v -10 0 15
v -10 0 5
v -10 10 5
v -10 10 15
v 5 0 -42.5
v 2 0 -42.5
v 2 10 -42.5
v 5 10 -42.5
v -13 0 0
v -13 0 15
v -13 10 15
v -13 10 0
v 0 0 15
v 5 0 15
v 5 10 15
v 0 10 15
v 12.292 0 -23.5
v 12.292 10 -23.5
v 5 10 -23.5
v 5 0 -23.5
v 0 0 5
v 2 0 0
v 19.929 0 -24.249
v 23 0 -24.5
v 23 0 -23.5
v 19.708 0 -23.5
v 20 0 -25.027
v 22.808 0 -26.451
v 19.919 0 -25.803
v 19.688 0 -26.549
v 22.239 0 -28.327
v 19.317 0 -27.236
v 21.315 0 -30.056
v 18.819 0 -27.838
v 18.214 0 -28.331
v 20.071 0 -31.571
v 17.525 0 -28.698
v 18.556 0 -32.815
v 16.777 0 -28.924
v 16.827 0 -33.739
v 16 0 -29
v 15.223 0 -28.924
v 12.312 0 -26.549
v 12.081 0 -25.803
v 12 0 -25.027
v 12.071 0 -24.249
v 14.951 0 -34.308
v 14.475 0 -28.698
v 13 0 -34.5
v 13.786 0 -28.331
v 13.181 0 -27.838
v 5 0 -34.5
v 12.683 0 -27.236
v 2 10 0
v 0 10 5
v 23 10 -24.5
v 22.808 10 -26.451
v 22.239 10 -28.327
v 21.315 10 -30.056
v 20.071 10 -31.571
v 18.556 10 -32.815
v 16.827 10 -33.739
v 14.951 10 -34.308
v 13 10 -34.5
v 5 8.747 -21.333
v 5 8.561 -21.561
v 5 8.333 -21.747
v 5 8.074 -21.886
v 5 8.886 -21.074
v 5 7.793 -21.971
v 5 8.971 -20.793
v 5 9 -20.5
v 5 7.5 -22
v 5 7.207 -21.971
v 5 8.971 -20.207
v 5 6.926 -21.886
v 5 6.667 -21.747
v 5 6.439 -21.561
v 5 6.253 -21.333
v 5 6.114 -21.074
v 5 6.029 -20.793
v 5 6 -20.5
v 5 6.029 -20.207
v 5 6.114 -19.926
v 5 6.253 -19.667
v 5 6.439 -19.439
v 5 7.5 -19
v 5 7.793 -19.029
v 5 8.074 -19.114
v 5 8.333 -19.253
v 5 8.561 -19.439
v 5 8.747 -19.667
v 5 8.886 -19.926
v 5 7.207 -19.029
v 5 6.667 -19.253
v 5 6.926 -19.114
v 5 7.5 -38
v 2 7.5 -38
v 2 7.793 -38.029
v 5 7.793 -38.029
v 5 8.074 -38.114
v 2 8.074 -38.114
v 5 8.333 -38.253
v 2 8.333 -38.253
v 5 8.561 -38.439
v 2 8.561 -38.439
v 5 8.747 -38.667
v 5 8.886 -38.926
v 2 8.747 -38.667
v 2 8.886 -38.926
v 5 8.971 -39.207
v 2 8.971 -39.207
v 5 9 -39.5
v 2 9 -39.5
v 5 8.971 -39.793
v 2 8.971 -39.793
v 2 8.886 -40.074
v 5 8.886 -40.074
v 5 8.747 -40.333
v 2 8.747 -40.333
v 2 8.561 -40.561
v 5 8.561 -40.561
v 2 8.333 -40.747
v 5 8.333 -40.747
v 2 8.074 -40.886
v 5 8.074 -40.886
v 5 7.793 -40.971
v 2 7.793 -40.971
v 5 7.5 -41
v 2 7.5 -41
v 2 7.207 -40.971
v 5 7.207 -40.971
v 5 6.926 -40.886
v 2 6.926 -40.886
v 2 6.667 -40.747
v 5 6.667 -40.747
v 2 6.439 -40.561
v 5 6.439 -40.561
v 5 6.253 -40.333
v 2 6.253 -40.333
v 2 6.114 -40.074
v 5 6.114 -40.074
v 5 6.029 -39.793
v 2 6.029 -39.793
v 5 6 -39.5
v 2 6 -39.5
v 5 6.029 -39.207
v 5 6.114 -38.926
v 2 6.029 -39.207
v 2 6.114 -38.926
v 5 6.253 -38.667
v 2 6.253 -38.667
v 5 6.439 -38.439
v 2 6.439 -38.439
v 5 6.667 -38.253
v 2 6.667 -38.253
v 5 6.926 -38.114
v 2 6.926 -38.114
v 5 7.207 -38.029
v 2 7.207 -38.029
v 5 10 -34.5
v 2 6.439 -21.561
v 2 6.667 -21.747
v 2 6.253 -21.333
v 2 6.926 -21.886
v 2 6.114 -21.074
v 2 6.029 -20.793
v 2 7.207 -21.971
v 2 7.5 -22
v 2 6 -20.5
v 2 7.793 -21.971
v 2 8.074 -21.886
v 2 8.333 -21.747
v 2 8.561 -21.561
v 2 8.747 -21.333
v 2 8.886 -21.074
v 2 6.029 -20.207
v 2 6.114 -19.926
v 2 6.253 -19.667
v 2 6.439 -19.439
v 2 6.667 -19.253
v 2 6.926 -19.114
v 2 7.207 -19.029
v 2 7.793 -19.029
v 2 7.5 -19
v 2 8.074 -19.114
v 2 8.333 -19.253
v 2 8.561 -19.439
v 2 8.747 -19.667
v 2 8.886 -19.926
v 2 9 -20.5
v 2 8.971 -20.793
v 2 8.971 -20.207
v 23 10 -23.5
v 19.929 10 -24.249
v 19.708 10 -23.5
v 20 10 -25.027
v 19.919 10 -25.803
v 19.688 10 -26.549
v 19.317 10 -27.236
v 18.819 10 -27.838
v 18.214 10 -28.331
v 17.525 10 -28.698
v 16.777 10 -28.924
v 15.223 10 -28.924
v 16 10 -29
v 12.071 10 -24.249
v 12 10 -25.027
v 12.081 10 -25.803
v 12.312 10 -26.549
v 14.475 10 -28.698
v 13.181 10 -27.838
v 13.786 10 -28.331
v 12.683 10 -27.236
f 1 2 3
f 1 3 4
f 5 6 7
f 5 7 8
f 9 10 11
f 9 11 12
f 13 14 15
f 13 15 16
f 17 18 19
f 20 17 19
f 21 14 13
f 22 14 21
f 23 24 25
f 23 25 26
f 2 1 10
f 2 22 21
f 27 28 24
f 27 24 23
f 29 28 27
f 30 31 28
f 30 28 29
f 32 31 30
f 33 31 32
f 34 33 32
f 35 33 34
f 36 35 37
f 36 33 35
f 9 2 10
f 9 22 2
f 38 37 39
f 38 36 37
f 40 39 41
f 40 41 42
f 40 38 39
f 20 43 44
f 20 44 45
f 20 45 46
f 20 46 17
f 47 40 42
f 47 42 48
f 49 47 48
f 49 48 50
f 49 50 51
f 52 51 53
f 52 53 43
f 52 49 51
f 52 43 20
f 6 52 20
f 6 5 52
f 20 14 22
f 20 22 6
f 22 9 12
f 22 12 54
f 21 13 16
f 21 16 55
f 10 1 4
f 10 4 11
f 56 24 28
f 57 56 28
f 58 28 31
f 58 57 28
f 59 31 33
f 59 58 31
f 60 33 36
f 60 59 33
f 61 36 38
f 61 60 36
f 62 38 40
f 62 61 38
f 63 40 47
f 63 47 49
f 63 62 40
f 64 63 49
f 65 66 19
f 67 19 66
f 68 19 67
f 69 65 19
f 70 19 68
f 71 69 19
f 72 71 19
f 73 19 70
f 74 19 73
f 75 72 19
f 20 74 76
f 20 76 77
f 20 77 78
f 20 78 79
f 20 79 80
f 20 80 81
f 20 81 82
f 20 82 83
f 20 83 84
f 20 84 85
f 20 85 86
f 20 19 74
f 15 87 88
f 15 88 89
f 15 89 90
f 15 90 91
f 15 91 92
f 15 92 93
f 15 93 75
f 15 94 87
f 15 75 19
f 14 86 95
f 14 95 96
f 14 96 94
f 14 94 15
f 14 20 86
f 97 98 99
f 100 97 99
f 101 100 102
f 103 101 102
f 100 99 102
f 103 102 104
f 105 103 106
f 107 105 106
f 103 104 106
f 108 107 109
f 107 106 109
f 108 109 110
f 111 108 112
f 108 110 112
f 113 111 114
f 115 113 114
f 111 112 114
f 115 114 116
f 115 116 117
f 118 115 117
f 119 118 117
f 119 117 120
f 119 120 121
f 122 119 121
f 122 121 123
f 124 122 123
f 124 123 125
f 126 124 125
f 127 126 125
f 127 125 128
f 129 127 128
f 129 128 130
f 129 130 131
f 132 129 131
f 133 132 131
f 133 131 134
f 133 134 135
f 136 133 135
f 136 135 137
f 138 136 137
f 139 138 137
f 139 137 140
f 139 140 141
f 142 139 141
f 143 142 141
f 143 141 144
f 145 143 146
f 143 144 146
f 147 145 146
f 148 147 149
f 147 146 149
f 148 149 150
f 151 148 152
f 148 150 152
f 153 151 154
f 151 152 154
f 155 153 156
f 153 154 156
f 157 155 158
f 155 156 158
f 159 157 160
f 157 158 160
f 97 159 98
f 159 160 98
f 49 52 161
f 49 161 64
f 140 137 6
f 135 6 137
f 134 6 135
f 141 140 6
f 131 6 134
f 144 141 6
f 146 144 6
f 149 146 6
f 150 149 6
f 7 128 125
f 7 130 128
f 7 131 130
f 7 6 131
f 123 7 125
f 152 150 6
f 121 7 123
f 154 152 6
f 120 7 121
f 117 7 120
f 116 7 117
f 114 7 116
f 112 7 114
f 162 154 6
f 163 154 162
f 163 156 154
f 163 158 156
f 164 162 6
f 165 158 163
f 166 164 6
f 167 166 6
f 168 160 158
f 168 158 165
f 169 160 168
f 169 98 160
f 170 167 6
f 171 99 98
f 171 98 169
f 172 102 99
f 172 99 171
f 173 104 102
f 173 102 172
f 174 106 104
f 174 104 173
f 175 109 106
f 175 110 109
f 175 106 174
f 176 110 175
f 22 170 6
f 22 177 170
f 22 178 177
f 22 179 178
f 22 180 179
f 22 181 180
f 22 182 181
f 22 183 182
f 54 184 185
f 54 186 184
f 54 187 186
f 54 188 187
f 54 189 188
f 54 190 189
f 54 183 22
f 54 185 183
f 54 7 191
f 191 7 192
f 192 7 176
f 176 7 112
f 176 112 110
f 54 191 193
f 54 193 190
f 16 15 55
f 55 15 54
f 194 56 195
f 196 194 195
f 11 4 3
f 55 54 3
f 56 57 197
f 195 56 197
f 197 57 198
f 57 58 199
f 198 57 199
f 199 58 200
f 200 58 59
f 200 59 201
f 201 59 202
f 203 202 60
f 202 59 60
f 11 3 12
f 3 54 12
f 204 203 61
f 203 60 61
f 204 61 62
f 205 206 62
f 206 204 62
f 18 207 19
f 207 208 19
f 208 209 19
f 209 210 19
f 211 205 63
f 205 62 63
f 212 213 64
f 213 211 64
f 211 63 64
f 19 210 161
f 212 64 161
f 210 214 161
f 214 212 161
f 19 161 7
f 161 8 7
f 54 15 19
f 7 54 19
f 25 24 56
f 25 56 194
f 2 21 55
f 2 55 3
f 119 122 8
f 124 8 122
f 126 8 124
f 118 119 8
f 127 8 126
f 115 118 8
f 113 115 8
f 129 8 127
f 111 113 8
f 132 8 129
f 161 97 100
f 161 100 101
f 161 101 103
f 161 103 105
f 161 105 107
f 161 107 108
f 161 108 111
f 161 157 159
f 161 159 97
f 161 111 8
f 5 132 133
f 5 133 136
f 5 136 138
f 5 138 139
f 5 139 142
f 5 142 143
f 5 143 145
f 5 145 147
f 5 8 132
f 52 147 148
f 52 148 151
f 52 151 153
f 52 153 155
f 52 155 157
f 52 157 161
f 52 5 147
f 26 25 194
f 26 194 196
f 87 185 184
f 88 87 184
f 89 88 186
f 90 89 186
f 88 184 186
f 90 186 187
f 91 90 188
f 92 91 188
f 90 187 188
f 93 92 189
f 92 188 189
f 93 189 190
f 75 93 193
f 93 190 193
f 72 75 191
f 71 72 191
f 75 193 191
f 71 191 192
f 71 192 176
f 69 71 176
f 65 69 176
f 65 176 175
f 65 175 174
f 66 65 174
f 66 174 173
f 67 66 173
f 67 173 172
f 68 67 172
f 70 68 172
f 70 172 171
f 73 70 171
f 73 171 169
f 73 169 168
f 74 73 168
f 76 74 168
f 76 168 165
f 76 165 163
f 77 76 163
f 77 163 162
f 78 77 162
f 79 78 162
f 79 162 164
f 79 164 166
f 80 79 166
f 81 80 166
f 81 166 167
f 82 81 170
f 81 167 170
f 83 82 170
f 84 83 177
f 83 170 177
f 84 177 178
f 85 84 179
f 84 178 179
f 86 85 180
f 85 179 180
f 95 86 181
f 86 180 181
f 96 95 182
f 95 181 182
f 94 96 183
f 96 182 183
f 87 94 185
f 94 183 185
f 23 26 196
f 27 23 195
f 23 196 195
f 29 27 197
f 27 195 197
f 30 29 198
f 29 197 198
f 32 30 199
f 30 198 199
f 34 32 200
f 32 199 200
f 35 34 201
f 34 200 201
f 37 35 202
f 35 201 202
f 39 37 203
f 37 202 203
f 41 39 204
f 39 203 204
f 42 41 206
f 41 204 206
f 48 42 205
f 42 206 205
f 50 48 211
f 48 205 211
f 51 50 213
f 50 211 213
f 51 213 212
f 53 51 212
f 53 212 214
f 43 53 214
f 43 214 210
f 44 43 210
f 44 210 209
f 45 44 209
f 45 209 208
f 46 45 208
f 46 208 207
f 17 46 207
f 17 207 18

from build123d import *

# Parameters (mm, degrees)
BOSS_EXTRUDE1_DEPTH = 10
SKETCH2_R           = 4
CUT_EXTRUDE1_DEPTH  = 50.348252249
SKETCH3_R           = 1.5
CUT_EXTRUDE2_DEPTH  = 50.348252249
SKETCH5_W           = 42.5
SKETCH5_H           = 10
CUT_EXTRUDE4_DEPTH  = 2
FILLET1_R           = 10


with BuildPart() as part:
    # Sketch1 → Boss-Extrude1 (new body)
    with BuildSketch(Plane(origin=(0, 0, 0), x_dir=(1, 0, 0), z_dir=(0, 1, 0))):
        Polygon((0, 0), (0, 34), (0, 42.5), (5, 42.5), (5, 34.5), (23, 34.5), (23, 23.5), (5, 23.5), (5, -15), (0, -15), (0, -5), (-10, -5), (-10, -15), (-13, -15), (-13, 0), align=None)
    extrude(amount=BOSS_EXTRUDE1_DEPTH)

    # Sketch2 → Cut-Extrude1 (cut, through all)
    with BuildSketch(Plane(origin=(0, 10, 0), x_dir=(1, 0, 0), z_dir=(0, 1, 0))):
        with Locations((16, 25)):
            Circle(SKETCH2_R)
    extrude(amount=-CUT_EXTRUDE1_DEPTH, mode=Mode.SUBTRACT)

    # Sketch3 → Cut-Extrude2 (cut, through all)
    with BuildSketch(Plane.ZY):
        with Locations((-39.5, 7.5)):
            Circle(SKETCH3_R)
        with Locations((-20.5, 7.5)):
            Circle(SKETCH3_R)
    extrude(amount=-CUT_EXTRUDE2_DEPTH, mode=Mode.SUBTRACT)

    # Sketch5 → Cut-Extrude4 (cut)
    with BuildSketch(Plane.ZY):
        with Locations((-21.25, 5)):
            Rectangle(SKETCH5_W, SKETCH5_H)
    extrude(amount=-CUT_EXTRUDE4_DEPTH, mode=Mode.SUBTRACT)

    # Fillet1
    fillet1_edges = [part.edges().sort_by_distance(p)[0] for p in [
        (23, 5, -34.5),
    ]]
    fillet(fillet1_edges, radius=FILLET1_R)


solid = part.part
